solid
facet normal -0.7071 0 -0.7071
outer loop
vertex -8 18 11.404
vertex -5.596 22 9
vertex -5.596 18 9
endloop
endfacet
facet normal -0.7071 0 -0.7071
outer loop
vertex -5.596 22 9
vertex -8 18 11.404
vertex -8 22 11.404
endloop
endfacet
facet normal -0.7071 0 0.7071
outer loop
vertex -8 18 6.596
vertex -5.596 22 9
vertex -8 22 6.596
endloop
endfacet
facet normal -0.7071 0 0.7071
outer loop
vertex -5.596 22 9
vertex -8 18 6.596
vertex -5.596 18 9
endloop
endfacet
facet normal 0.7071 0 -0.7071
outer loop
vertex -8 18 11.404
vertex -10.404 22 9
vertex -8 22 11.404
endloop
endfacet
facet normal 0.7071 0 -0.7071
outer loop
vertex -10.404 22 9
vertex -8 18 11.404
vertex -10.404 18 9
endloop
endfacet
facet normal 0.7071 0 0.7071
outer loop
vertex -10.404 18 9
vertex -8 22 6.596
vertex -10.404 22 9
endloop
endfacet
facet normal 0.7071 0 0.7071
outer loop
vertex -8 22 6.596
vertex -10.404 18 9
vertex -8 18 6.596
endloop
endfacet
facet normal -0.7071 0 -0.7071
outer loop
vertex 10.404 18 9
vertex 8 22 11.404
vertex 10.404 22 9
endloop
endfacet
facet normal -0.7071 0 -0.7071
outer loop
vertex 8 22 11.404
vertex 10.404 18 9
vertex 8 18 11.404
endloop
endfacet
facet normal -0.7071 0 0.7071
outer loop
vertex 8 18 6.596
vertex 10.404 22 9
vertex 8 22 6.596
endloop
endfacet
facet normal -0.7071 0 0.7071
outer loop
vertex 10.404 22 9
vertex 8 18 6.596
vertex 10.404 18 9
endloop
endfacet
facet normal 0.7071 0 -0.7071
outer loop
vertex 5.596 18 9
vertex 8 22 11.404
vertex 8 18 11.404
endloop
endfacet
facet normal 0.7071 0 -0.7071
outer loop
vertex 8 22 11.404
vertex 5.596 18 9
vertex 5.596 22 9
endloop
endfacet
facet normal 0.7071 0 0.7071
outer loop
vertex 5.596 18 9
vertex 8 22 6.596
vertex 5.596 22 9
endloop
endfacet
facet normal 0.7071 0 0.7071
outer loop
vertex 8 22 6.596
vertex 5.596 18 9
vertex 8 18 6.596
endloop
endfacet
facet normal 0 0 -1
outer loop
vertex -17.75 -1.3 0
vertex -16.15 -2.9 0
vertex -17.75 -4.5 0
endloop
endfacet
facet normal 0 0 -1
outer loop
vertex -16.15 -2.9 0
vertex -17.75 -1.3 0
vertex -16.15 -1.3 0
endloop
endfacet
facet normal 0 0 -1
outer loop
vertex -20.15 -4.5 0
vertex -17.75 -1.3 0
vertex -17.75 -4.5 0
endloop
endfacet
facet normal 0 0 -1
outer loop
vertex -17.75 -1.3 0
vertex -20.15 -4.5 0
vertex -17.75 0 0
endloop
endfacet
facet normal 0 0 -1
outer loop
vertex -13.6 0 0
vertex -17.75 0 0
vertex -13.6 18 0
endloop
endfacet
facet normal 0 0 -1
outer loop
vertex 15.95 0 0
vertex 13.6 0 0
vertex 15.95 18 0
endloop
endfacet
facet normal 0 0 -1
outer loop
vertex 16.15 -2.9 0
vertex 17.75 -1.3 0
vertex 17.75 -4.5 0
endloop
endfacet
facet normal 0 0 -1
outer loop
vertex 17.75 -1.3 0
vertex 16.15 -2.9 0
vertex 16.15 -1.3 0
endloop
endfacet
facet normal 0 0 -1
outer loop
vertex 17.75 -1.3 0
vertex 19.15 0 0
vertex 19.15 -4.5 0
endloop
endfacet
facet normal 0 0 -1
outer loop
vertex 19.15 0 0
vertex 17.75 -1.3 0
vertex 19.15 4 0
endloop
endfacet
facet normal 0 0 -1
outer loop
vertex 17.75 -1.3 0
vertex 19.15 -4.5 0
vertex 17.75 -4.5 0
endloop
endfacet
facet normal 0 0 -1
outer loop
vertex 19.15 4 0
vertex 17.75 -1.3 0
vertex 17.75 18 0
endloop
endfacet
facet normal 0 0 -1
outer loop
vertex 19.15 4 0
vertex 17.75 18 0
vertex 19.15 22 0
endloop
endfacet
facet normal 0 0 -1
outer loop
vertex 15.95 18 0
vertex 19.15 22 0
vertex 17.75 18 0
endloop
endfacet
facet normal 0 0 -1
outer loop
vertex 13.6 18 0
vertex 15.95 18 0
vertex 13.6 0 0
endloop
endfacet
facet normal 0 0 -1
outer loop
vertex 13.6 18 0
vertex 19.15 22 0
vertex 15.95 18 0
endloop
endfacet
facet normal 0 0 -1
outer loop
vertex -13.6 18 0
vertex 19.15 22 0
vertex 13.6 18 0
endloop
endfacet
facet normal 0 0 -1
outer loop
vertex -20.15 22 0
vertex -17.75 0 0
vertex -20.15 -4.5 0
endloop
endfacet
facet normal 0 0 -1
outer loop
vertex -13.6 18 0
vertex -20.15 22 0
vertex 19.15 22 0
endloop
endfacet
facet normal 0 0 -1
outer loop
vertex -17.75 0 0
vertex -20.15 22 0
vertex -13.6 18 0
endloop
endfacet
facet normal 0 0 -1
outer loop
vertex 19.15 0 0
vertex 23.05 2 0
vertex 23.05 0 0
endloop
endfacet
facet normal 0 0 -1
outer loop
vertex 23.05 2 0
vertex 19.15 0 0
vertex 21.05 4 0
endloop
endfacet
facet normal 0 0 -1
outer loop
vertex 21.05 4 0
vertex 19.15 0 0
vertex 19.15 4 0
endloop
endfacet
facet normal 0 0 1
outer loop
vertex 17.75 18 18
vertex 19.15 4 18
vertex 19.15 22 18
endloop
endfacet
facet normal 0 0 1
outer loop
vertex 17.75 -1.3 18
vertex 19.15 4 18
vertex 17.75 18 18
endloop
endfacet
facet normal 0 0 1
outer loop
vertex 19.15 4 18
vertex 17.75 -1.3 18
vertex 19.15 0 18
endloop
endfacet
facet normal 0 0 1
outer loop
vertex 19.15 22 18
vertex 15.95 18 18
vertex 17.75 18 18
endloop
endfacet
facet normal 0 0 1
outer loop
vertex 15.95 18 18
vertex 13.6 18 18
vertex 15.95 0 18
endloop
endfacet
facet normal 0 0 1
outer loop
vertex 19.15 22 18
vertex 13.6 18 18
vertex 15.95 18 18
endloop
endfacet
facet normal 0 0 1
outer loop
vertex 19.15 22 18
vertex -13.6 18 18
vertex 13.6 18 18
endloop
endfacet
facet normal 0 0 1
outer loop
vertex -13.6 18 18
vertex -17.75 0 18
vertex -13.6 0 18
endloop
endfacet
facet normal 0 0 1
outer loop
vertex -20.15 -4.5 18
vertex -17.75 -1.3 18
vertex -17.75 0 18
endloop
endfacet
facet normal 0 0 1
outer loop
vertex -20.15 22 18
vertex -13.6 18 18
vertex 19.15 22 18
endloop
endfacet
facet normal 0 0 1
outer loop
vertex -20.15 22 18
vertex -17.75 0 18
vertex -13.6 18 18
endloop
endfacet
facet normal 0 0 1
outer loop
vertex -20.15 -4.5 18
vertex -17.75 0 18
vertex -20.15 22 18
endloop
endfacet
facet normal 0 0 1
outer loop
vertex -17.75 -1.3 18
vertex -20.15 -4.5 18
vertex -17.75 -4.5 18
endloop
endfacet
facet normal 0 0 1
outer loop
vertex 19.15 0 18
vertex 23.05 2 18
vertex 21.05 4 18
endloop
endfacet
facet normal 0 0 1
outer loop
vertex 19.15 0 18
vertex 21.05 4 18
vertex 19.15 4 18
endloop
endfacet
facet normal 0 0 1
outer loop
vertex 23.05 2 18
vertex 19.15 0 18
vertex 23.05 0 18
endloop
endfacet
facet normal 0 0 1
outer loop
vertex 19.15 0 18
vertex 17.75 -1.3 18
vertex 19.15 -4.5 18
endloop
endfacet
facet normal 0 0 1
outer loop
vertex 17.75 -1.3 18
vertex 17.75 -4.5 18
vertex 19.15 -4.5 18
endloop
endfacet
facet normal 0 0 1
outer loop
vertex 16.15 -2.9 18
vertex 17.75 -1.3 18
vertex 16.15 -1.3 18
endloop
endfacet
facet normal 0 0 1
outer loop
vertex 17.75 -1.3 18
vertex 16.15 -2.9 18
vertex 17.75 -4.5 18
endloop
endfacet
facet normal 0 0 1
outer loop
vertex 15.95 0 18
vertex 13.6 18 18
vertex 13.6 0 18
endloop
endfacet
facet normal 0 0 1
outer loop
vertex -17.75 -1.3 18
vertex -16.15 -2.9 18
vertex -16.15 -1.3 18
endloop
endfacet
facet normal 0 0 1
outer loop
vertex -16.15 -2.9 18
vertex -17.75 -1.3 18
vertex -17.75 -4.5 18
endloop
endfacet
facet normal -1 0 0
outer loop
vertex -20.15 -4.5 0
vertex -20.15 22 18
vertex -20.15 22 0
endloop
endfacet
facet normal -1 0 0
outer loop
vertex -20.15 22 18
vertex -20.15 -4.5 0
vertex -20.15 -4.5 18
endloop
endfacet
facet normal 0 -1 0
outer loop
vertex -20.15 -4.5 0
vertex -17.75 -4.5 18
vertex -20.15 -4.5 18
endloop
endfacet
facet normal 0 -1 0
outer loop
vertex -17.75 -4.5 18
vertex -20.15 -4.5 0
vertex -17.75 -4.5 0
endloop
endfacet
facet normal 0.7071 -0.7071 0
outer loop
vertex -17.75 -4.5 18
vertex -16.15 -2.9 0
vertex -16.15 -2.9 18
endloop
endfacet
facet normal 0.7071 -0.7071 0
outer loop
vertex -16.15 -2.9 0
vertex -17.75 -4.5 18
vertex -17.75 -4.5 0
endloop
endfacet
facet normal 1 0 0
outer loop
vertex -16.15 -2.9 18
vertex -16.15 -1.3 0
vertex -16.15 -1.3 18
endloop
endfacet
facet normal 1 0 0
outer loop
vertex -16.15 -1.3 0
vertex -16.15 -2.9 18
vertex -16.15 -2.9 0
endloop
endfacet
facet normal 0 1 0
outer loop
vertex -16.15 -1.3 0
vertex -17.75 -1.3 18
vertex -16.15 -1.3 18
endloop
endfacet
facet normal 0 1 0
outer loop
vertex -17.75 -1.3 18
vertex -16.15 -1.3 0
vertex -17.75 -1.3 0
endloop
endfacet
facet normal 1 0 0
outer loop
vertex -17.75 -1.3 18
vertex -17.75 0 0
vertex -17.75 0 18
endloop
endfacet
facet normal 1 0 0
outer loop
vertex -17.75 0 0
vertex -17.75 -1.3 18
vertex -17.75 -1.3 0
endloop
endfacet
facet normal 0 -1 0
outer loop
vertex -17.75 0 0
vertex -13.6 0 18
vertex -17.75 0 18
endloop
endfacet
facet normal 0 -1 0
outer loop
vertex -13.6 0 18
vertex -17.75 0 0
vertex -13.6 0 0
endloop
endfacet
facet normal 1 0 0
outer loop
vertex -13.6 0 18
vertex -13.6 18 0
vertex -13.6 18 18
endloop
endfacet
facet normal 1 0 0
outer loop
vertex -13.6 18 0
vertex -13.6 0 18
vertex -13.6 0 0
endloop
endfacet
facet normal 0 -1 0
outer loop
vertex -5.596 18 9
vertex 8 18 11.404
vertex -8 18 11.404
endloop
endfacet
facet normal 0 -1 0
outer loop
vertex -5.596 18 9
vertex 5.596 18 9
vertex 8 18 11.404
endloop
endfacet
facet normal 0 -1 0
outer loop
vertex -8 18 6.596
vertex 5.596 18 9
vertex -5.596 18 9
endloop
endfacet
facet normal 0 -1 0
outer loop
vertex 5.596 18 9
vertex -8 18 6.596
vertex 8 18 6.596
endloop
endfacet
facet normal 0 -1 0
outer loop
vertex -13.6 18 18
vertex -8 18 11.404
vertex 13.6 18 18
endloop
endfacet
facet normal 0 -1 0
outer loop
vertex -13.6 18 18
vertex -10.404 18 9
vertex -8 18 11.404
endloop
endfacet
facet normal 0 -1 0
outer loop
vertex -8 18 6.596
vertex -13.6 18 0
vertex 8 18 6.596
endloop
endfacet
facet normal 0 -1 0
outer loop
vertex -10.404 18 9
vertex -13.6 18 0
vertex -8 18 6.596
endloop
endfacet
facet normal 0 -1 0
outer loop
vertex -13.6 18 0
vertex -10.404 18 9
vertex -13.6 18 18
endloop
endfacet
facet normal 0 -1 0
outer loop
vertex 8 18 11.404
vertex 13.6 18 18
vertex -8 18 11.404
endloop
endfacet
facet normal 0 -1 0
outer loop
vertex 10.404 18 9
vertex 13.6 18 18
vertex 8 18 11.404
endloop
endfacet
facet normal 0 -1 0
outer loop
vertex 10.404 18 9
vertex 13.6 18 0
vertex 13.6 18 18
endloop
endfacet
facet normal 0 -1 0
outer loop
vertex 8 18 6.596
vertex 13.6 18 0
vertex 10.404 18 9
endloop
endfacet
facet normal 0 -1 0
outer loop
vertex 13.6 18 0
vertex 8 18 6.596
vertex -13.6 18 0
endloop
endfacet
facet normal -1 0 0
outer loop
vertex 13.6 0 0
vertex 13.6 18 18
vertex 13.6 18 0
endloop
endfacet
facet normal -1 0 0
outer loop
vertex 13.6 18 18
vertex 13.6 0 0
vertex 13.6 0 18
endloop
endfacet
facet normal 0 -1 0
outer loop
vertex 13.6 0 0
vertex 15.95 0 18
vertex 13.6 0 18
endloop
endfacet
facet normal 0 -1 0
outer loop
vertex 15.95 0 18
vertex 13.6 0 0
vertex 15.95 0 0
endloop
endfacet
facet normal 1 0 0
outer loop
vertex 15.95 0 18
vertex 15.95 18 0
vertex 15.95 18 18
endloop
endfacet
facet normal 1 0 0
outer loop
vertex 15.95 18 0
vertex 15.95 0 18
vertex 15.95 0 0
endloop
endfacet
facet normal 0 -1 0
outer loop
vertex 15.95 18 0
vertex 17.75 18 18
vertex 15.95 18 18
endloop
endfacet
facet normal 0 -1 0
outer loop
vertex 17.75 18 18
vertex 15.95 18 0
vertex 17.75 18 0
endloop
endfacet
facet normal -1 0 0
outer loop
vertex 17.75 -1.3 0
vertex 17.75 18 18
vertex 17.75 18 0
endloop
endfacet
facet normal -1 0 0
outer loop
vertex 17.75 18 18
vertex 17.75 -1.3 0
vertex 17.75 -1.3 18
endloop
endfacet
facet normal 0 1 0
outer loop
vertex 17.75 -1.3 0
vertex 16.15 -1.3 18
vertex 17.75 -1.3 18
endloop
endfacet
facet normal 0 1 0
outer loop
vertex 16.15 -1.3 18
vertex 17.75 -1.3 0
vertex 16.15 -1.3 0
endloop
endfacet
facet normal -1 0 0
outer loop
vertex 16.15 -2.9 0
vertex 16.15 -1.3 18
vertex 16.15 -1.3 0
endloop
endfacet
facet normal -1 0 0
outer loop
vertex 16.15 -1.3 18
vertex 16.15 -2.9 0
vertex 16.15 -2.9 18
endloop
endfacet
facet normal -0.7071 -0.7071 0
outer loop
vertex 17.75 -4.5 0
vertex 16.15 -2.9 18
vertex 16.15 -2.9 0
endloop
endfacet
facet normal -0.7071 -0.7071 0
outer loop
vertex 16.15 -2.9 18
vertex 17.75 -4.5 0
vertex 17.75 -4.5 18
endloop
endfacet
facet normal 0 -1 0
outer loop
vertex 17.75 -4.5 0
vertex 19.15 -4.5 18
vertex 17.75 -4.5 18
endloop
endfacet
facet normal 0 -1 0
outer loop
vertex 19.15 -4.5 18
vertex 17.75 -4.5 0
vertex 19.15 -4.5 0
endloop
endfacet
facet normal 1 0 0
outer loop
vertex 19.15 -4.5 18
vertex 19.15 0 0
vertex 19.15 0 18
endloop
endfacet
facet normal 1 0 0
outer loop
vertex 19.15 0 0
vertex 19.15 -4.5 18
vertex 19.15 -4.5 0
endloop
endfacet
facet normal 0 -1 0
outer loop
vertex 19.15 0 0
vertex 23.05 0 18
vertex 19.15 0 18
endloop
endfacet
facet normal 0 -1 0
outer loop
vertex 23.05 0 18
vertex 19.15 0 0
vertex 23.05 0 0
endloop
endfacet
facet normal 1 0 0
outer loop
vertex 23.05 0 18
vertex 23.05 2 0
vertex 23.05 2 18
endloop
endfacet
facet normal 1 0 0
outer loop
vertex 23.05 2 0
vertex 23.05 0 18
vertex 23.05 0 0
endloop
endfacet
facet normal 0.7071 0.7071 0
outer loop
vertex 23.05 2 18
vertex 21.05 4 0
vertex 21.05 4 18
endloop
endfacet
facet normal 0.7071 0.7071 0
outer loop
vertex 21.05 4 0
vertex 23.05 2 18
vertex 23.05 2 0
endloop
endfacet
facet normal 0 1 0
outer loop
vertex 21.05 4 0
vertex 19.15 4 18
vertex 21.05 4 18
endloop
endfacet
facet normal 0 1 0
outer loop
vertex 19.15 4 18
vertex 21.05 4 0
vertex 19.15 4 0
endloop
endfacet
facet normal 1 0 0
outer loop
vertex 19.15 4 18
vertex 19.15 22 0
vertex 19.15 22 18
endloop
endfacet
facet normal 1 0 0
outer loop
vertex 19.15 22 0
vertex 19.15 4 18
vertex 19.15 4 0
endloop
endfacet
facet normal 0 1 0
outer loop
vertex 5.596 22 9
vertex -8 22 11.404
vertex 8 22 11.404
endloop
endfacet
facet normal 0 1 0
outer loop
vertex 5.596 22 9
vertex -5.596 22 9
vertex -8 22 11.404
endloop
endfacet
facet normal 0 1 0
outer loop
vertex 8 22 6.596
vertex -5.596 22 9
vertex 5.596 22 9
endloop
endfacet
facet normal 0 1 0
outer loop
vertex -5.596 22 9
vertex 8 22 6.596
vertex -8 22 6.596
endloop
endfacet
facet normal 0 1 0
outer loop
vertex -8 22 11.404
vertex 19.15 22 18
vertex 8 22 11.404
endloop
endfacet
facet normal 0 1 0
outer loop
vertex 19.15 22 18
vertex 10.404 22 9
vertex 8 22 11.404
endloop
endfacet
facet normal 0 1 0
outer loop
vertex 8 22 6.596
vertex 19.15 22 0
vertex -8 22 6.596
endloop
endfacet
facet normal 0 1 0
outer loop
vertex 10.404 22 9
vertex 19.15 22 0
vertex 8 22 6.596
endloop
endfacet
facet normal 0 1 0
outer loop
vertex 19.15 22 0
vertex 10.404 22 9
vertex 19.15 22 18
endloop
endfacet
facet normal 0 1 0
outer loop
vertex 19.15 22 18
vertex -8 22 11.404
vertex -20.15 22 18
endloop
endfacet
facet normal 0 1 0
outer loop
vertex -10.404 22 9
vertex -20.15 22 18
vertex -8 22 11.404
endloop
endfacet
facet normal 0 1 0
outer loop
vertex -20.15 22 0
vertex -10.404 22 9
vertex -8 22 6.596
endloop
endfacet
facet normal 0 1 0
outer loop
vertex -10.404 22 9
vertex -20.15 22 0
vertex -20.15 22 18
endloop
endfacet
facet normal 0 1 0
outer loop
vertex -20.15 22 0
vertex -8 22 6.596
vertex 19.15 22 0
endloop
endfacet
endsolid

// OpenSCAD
// Generic DIN rail clip with two support-free M3 screw bores.
// PETG recommended. Print exactly as shown, the flat cross-section on Z=0;
// no supports, 0.2 mm layers, at least 4 perimeters, no brim in latch gaps.
// Attach a panel to the Y=front face with two M3 bolts, nuts and washers.
// Bore centres: X=+/-mount_spacing/2, Z=clip_width/2. Fit nuts inside the
// open bridge BEFORE snapping onto the rail. Screw length = panel + bridge
// thickness + nut/washer thickness; the default 3 mm panel uses M3x12.
// Fits TS35 / EN 60715 / IEC 60715 top-hat rail, 7.5 or 15 mm deep.
// Default interface: 35 mm overall, 1 mm flange; rail_inner locates the seats.
// Depth does not enter the fit: only the outer flange edges are gripped.
// For 1.5 mm sheet (e.g. TS35 x 15), set flange_thickness = 1.5.
// Nominal fit: 0.30 mm TOTAL slot play, 0.25 mm at each outer edge,
// and 1.35 mm retaining overlap per lip (hook_overlap - edge_clearance).
// The beam deflects during engagement; the seated rail has clearance,
// not spring preload. Use rail end stops where sliding must be prevented.
// Checked on the dev server with separate 7.5/1 and 15/1.5 mm rail sections;
// geometry checks do not establish printed spring strength or fatigue life.
// Hook the rigid left lip first, then press the right ramp over the rail.
// Pull the right-hand tab outward to release; do not bend the whole carrier.
// Original geometry; fit-test the clip before fitting electronics.
// Rail references:
// https://eshop.weidmueller.com/en/ts-35x7-5ll-1mstzn/p/0514510000
// https://assets.dam.weidmueller.com/assets/api/ab2b4e3c-189d-4eae-b435-7c5a77e1ac25/Original/MB_BUILDING_EN_2025_WEB.pdf

/* [Rail fit] */
rail_width = 35; // Outside flange width, mm [34.8:0.1:35.2]
rail_inner = 25; // Seat-position reference; need not match the rail web, mm [24:0.5:27]
flange_thickness = 1; // Measured sheet thickness, mm [1:0.1:1.5]
fit_clearance = 0.3; // Total flange slot clearance, mm [0.2:0.05:0.4]
edge_clearance = 0.25; // Clearance at each outer rail edge, mm [0.2:0.05:0.4]
spring_wall = 1.4; // Flexible beam thickness, mm [1.2:0.1:1.6]
spring_length = 18; // Beam root distance above the rail face, mm [18:1:24]
hook_overlap = 1.6; // Tooth reach inward from the side wall, mm [1.4:0.1:1.8]
clip_width = 18; // Contact length along the rail, mm [14:2:30]
bridge_thickness = 4; // Front mounting bridge thickness, mm [3:0.5:5]
mount_spacing = 16; // Two M3 attachment centres across rail, mm [12:2:20]
mount_hole = 3.4; // M3 shaft clearance, mm [3.3:0.1:3.6]

/* [Hidden] */
$fn = 24; // Facets per circular hole / standoff
cut_extra = 0.1; // Boolean cutter overlap, mm
rigid_wall = 2.4; // Rigid hook side wall thickness, mm
tooth_thickness = 1.6; // Minimum retaining lip thickness, mm
seat_gap = 1.8; // Air gap beside the spring, mm
edge = rail_width/2 + edge_clearance; // Outer side-wall datum, mm
slot = flange_thickness + fit_clearance; // Flange capture slot height, mm
front = spring_length + bridge_thickness; // Mounting face Y coordinate, mm
seat_inner = rail_inner/2 + 1.1; // Keep seats outside the inner opening, mm
seat_outer = edge - seat_gap; // Spring-side rigid seat outer edge, mm

// Cross-section lies in XY. Rail length is Z; rail front is Y=0.
// All material below Y=0 stays within the outer 1.8 mm of each flange.
// The independent right beam flexes in XY, along continuous print layers.
module clip_profile() {
    union() {
        translate([-edge-rigid_wall,spring_length])
            square([2*edge+rigid_wall+spring_wall,bridge_thickness]);
        // Rigid side and the left flange's front seat.
        translate([-edge-rigid_wall,0])
            square([edge+rigid_wall-seat_inner,spring_length+0.1]);
        polygon([[-edge-rigid_wall,0],[-edge,0],[-edge,-slot],
                 [-edge+hook_overlap,-slot],
                 [-edge+hook_overlap,-slot-tooth_thickness],
                 [-edge,-slot-tooth_thickness-hook_overlap],
                 [-edge-rigid_wall,-slot-tooth_thickness-hook_overlap]]);
        // Right seat is separated from the beam all the way to its root.
        translate([seat_inner,0])
            square([seat_outer-seat_inner,spring_length+0.1]);
        polygon([[edge,-slot-tooth_thickness-hook_overlap],
                 [edge+spring_wall,-slot-tooth_thickness-hook_overlap],
                 [edge+spring_wall,spring_length+0.1],
                 [edge,spring_length+0.1],[edge,-slot],
                 [edge-hook_overlap,-slot],
                 [edge-hook_overlap,-slot-tooth_thickness]]);
        // Solid thumb / screwdriver tab, with a chamfered outside corner.
        translate([edge+spring_wall-0.1,0])
            polygon([[0,0],[4,0],[4,2],[2,4],[0,4]]);
    }
}

// Diamond bores have 45-degree roofs and accept a round M3 shaft.
// Their across-flats dimension is mount_hole, not the corner-to-corner size.
module attachment_bores() {
    for (x = [-mount_spacing/2,mount_spacing/2])
        translate([x,front+cut_extra,clip_width/2])
            rotate([90,0,0])
                linear_extrude(bridge_thickness+2*cut_extra)
                    rotate(45) square([mount_hole,mount_hole],center=true);
}

module rail_clip() {
    difference() {
        linear_extrude(clip_width) clip_profile();
        attachment_bores();
    }
}

color("#89c454") rail_clip();
